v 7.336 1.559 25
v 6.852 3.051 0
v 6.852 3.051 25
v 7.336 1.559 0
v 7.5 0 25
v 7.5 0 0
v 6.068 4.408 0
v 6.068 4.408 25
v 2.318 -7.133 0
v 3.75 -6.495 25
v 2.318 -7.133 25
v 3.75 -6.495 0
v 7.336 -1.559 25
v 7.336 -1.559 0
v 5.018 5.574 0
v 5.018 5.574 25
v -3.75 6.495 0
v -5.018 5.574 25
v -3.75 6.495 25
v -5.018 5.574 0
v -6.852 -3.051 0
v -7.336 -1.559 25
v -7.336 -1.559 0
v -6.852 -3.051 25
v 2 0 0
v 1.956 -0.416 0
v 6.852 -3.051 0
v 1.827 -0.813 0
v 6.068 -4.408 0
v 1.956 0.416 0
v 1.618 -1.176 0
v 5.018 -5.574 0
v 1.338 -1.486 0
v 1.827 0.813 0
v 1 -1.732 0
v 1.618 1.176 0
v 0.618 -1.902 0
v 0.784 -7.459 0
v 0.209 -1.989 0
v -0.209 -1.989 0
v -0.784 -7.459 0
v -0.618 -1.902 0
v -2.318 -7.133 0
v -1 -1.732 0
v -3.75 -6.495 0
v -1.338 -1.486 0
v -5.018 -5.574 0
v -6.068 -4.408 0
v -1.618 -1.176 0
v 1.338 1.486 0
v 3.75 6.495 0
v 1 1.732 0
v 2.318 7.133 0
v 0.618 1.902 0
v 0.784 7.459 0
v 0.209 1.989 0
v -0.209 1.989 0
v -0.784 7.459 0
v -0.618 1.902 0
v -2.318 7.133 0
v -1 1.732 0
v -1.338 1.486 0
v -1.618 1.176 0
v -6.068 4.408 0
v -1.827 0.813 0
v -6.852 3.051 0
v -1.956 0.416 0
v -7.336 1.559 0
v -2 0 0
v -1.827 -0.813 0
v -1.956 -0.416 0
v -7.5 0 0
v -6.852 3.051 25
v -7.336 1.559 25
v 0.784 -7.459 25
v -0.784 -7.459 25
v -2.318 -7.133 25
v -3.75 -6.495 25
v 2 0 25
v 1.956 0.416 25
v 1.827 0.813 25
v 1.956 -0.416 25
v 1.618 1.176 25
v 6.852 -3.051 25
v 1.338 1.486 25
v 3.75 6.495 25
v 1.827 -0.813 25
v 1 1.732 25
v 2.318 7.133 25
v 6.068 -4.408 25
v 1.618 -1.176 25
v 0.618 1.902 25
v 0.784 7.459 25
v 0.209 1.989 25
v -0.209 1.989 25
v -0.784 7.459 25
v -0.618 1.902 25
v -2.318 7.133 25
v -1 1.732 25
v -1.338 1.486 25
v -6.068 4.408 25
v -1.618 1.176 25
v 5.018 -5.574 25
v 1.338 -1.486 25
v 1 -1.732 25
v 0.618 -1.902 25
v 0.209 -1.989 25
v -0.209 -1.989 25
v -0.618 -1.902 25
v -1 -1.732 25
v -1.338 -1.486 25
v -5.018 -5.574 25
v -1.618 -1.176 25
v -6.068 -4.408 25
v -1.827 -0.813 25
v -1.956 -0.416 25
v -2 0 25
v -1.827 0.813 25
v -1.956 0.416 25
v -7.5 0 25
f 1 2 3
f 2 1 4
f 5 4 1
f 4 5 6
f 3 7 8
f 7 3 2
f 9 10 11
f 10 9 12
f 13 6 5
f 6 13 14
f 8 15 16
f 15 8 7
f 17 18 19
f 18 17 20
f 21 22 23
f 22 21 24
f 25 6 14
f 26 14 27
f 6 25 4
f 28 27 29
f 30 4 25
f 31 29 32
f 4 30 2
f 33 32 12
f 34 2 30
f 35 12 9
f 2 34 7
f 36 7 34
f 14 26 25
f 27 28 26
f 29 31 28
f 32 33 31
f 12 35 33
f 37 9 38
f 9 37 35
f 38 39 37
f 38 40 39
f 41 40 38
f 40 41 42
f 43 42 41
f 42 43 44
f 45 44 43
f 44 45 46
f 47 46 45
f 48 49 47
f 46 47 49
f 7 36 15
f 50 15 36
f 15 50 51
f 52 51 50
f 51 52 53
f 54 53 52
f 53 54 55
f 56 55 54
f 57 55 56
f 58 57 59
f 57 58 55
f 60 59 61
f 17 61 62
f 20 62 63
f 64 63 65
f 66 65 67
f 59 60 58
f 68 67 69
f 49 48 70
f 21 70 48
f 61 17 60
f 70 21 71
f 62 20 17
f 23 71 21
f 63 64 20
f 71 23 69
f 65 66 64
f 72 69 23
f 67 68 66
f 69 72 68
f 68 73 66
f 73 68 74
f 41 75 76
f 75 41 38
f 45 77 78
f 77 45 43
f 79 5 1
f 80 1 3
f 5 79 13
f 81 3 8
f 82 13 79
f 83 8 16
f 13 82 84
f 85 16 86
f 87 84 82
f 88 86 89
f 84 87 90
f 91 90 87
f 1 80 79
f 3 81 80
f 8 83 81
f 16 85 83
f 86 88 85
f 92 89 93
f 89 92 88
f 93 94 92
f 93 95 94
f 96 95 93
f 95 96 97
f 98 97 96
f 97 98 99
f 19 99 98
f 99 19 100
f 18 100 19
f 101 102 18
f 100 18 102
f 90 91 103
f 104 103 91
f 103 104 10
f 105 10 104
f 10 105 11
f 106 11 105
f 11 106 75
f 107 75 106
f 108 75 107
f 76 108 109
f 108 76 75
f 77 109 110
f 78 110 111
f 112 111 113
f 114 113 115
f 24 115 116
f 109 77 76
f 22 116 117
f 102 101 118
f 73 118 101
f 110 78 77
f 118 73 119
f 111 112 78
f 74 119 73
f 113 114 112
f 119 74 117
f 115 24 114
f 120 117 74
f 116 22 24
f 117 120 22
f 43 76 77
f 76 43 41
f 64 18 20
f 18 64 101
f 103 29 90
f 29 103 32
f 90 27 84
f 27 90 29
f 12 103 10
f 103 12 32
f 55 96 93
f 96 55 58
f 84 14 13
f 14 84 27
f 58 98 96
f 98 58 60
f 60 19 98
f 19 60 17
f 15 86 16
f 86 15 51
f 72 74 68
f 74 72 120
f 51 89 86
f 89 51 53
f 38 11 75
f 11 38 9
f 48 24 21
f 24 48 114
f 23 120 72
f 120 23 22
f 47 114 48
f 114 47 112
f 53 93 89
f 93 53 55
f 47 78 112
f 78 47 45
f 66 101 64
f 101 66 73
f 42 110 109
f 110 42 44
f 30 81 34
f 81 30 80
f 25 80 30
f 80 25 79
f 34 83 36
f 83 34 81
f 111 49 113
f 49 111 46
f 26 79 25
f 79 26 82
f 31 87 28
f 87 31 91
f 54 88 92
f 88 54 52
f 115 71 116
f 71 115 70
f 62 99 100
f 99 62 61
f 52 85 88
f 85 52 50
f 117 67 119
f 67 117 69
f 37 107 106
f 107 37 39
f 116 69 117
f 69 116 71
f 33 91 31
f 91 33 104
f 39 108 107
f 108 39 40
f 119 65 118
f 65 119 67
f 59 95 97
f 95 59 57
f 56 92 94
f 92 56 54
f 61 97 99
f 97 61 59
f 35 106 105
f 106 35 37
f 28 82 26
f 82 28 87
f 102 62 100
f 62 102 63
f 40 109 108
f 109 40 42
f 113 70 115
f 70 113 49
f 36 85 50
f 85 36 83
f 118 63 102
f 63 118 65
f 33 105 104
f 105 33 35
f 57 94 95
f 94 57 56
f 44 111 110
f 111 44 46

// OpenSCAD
h=25;
d=15;
hole = 4;
blokhoogte = 0;

module pennedop() {
$fs=0.1;
	difference() {
		cylinder(h+blokhoogte,d/2,d/2);
		translate([0,0,-0.1])cylinder(h+blokhoogte+2,hole/2,hole/2);
		


	}


}

pennedop();
